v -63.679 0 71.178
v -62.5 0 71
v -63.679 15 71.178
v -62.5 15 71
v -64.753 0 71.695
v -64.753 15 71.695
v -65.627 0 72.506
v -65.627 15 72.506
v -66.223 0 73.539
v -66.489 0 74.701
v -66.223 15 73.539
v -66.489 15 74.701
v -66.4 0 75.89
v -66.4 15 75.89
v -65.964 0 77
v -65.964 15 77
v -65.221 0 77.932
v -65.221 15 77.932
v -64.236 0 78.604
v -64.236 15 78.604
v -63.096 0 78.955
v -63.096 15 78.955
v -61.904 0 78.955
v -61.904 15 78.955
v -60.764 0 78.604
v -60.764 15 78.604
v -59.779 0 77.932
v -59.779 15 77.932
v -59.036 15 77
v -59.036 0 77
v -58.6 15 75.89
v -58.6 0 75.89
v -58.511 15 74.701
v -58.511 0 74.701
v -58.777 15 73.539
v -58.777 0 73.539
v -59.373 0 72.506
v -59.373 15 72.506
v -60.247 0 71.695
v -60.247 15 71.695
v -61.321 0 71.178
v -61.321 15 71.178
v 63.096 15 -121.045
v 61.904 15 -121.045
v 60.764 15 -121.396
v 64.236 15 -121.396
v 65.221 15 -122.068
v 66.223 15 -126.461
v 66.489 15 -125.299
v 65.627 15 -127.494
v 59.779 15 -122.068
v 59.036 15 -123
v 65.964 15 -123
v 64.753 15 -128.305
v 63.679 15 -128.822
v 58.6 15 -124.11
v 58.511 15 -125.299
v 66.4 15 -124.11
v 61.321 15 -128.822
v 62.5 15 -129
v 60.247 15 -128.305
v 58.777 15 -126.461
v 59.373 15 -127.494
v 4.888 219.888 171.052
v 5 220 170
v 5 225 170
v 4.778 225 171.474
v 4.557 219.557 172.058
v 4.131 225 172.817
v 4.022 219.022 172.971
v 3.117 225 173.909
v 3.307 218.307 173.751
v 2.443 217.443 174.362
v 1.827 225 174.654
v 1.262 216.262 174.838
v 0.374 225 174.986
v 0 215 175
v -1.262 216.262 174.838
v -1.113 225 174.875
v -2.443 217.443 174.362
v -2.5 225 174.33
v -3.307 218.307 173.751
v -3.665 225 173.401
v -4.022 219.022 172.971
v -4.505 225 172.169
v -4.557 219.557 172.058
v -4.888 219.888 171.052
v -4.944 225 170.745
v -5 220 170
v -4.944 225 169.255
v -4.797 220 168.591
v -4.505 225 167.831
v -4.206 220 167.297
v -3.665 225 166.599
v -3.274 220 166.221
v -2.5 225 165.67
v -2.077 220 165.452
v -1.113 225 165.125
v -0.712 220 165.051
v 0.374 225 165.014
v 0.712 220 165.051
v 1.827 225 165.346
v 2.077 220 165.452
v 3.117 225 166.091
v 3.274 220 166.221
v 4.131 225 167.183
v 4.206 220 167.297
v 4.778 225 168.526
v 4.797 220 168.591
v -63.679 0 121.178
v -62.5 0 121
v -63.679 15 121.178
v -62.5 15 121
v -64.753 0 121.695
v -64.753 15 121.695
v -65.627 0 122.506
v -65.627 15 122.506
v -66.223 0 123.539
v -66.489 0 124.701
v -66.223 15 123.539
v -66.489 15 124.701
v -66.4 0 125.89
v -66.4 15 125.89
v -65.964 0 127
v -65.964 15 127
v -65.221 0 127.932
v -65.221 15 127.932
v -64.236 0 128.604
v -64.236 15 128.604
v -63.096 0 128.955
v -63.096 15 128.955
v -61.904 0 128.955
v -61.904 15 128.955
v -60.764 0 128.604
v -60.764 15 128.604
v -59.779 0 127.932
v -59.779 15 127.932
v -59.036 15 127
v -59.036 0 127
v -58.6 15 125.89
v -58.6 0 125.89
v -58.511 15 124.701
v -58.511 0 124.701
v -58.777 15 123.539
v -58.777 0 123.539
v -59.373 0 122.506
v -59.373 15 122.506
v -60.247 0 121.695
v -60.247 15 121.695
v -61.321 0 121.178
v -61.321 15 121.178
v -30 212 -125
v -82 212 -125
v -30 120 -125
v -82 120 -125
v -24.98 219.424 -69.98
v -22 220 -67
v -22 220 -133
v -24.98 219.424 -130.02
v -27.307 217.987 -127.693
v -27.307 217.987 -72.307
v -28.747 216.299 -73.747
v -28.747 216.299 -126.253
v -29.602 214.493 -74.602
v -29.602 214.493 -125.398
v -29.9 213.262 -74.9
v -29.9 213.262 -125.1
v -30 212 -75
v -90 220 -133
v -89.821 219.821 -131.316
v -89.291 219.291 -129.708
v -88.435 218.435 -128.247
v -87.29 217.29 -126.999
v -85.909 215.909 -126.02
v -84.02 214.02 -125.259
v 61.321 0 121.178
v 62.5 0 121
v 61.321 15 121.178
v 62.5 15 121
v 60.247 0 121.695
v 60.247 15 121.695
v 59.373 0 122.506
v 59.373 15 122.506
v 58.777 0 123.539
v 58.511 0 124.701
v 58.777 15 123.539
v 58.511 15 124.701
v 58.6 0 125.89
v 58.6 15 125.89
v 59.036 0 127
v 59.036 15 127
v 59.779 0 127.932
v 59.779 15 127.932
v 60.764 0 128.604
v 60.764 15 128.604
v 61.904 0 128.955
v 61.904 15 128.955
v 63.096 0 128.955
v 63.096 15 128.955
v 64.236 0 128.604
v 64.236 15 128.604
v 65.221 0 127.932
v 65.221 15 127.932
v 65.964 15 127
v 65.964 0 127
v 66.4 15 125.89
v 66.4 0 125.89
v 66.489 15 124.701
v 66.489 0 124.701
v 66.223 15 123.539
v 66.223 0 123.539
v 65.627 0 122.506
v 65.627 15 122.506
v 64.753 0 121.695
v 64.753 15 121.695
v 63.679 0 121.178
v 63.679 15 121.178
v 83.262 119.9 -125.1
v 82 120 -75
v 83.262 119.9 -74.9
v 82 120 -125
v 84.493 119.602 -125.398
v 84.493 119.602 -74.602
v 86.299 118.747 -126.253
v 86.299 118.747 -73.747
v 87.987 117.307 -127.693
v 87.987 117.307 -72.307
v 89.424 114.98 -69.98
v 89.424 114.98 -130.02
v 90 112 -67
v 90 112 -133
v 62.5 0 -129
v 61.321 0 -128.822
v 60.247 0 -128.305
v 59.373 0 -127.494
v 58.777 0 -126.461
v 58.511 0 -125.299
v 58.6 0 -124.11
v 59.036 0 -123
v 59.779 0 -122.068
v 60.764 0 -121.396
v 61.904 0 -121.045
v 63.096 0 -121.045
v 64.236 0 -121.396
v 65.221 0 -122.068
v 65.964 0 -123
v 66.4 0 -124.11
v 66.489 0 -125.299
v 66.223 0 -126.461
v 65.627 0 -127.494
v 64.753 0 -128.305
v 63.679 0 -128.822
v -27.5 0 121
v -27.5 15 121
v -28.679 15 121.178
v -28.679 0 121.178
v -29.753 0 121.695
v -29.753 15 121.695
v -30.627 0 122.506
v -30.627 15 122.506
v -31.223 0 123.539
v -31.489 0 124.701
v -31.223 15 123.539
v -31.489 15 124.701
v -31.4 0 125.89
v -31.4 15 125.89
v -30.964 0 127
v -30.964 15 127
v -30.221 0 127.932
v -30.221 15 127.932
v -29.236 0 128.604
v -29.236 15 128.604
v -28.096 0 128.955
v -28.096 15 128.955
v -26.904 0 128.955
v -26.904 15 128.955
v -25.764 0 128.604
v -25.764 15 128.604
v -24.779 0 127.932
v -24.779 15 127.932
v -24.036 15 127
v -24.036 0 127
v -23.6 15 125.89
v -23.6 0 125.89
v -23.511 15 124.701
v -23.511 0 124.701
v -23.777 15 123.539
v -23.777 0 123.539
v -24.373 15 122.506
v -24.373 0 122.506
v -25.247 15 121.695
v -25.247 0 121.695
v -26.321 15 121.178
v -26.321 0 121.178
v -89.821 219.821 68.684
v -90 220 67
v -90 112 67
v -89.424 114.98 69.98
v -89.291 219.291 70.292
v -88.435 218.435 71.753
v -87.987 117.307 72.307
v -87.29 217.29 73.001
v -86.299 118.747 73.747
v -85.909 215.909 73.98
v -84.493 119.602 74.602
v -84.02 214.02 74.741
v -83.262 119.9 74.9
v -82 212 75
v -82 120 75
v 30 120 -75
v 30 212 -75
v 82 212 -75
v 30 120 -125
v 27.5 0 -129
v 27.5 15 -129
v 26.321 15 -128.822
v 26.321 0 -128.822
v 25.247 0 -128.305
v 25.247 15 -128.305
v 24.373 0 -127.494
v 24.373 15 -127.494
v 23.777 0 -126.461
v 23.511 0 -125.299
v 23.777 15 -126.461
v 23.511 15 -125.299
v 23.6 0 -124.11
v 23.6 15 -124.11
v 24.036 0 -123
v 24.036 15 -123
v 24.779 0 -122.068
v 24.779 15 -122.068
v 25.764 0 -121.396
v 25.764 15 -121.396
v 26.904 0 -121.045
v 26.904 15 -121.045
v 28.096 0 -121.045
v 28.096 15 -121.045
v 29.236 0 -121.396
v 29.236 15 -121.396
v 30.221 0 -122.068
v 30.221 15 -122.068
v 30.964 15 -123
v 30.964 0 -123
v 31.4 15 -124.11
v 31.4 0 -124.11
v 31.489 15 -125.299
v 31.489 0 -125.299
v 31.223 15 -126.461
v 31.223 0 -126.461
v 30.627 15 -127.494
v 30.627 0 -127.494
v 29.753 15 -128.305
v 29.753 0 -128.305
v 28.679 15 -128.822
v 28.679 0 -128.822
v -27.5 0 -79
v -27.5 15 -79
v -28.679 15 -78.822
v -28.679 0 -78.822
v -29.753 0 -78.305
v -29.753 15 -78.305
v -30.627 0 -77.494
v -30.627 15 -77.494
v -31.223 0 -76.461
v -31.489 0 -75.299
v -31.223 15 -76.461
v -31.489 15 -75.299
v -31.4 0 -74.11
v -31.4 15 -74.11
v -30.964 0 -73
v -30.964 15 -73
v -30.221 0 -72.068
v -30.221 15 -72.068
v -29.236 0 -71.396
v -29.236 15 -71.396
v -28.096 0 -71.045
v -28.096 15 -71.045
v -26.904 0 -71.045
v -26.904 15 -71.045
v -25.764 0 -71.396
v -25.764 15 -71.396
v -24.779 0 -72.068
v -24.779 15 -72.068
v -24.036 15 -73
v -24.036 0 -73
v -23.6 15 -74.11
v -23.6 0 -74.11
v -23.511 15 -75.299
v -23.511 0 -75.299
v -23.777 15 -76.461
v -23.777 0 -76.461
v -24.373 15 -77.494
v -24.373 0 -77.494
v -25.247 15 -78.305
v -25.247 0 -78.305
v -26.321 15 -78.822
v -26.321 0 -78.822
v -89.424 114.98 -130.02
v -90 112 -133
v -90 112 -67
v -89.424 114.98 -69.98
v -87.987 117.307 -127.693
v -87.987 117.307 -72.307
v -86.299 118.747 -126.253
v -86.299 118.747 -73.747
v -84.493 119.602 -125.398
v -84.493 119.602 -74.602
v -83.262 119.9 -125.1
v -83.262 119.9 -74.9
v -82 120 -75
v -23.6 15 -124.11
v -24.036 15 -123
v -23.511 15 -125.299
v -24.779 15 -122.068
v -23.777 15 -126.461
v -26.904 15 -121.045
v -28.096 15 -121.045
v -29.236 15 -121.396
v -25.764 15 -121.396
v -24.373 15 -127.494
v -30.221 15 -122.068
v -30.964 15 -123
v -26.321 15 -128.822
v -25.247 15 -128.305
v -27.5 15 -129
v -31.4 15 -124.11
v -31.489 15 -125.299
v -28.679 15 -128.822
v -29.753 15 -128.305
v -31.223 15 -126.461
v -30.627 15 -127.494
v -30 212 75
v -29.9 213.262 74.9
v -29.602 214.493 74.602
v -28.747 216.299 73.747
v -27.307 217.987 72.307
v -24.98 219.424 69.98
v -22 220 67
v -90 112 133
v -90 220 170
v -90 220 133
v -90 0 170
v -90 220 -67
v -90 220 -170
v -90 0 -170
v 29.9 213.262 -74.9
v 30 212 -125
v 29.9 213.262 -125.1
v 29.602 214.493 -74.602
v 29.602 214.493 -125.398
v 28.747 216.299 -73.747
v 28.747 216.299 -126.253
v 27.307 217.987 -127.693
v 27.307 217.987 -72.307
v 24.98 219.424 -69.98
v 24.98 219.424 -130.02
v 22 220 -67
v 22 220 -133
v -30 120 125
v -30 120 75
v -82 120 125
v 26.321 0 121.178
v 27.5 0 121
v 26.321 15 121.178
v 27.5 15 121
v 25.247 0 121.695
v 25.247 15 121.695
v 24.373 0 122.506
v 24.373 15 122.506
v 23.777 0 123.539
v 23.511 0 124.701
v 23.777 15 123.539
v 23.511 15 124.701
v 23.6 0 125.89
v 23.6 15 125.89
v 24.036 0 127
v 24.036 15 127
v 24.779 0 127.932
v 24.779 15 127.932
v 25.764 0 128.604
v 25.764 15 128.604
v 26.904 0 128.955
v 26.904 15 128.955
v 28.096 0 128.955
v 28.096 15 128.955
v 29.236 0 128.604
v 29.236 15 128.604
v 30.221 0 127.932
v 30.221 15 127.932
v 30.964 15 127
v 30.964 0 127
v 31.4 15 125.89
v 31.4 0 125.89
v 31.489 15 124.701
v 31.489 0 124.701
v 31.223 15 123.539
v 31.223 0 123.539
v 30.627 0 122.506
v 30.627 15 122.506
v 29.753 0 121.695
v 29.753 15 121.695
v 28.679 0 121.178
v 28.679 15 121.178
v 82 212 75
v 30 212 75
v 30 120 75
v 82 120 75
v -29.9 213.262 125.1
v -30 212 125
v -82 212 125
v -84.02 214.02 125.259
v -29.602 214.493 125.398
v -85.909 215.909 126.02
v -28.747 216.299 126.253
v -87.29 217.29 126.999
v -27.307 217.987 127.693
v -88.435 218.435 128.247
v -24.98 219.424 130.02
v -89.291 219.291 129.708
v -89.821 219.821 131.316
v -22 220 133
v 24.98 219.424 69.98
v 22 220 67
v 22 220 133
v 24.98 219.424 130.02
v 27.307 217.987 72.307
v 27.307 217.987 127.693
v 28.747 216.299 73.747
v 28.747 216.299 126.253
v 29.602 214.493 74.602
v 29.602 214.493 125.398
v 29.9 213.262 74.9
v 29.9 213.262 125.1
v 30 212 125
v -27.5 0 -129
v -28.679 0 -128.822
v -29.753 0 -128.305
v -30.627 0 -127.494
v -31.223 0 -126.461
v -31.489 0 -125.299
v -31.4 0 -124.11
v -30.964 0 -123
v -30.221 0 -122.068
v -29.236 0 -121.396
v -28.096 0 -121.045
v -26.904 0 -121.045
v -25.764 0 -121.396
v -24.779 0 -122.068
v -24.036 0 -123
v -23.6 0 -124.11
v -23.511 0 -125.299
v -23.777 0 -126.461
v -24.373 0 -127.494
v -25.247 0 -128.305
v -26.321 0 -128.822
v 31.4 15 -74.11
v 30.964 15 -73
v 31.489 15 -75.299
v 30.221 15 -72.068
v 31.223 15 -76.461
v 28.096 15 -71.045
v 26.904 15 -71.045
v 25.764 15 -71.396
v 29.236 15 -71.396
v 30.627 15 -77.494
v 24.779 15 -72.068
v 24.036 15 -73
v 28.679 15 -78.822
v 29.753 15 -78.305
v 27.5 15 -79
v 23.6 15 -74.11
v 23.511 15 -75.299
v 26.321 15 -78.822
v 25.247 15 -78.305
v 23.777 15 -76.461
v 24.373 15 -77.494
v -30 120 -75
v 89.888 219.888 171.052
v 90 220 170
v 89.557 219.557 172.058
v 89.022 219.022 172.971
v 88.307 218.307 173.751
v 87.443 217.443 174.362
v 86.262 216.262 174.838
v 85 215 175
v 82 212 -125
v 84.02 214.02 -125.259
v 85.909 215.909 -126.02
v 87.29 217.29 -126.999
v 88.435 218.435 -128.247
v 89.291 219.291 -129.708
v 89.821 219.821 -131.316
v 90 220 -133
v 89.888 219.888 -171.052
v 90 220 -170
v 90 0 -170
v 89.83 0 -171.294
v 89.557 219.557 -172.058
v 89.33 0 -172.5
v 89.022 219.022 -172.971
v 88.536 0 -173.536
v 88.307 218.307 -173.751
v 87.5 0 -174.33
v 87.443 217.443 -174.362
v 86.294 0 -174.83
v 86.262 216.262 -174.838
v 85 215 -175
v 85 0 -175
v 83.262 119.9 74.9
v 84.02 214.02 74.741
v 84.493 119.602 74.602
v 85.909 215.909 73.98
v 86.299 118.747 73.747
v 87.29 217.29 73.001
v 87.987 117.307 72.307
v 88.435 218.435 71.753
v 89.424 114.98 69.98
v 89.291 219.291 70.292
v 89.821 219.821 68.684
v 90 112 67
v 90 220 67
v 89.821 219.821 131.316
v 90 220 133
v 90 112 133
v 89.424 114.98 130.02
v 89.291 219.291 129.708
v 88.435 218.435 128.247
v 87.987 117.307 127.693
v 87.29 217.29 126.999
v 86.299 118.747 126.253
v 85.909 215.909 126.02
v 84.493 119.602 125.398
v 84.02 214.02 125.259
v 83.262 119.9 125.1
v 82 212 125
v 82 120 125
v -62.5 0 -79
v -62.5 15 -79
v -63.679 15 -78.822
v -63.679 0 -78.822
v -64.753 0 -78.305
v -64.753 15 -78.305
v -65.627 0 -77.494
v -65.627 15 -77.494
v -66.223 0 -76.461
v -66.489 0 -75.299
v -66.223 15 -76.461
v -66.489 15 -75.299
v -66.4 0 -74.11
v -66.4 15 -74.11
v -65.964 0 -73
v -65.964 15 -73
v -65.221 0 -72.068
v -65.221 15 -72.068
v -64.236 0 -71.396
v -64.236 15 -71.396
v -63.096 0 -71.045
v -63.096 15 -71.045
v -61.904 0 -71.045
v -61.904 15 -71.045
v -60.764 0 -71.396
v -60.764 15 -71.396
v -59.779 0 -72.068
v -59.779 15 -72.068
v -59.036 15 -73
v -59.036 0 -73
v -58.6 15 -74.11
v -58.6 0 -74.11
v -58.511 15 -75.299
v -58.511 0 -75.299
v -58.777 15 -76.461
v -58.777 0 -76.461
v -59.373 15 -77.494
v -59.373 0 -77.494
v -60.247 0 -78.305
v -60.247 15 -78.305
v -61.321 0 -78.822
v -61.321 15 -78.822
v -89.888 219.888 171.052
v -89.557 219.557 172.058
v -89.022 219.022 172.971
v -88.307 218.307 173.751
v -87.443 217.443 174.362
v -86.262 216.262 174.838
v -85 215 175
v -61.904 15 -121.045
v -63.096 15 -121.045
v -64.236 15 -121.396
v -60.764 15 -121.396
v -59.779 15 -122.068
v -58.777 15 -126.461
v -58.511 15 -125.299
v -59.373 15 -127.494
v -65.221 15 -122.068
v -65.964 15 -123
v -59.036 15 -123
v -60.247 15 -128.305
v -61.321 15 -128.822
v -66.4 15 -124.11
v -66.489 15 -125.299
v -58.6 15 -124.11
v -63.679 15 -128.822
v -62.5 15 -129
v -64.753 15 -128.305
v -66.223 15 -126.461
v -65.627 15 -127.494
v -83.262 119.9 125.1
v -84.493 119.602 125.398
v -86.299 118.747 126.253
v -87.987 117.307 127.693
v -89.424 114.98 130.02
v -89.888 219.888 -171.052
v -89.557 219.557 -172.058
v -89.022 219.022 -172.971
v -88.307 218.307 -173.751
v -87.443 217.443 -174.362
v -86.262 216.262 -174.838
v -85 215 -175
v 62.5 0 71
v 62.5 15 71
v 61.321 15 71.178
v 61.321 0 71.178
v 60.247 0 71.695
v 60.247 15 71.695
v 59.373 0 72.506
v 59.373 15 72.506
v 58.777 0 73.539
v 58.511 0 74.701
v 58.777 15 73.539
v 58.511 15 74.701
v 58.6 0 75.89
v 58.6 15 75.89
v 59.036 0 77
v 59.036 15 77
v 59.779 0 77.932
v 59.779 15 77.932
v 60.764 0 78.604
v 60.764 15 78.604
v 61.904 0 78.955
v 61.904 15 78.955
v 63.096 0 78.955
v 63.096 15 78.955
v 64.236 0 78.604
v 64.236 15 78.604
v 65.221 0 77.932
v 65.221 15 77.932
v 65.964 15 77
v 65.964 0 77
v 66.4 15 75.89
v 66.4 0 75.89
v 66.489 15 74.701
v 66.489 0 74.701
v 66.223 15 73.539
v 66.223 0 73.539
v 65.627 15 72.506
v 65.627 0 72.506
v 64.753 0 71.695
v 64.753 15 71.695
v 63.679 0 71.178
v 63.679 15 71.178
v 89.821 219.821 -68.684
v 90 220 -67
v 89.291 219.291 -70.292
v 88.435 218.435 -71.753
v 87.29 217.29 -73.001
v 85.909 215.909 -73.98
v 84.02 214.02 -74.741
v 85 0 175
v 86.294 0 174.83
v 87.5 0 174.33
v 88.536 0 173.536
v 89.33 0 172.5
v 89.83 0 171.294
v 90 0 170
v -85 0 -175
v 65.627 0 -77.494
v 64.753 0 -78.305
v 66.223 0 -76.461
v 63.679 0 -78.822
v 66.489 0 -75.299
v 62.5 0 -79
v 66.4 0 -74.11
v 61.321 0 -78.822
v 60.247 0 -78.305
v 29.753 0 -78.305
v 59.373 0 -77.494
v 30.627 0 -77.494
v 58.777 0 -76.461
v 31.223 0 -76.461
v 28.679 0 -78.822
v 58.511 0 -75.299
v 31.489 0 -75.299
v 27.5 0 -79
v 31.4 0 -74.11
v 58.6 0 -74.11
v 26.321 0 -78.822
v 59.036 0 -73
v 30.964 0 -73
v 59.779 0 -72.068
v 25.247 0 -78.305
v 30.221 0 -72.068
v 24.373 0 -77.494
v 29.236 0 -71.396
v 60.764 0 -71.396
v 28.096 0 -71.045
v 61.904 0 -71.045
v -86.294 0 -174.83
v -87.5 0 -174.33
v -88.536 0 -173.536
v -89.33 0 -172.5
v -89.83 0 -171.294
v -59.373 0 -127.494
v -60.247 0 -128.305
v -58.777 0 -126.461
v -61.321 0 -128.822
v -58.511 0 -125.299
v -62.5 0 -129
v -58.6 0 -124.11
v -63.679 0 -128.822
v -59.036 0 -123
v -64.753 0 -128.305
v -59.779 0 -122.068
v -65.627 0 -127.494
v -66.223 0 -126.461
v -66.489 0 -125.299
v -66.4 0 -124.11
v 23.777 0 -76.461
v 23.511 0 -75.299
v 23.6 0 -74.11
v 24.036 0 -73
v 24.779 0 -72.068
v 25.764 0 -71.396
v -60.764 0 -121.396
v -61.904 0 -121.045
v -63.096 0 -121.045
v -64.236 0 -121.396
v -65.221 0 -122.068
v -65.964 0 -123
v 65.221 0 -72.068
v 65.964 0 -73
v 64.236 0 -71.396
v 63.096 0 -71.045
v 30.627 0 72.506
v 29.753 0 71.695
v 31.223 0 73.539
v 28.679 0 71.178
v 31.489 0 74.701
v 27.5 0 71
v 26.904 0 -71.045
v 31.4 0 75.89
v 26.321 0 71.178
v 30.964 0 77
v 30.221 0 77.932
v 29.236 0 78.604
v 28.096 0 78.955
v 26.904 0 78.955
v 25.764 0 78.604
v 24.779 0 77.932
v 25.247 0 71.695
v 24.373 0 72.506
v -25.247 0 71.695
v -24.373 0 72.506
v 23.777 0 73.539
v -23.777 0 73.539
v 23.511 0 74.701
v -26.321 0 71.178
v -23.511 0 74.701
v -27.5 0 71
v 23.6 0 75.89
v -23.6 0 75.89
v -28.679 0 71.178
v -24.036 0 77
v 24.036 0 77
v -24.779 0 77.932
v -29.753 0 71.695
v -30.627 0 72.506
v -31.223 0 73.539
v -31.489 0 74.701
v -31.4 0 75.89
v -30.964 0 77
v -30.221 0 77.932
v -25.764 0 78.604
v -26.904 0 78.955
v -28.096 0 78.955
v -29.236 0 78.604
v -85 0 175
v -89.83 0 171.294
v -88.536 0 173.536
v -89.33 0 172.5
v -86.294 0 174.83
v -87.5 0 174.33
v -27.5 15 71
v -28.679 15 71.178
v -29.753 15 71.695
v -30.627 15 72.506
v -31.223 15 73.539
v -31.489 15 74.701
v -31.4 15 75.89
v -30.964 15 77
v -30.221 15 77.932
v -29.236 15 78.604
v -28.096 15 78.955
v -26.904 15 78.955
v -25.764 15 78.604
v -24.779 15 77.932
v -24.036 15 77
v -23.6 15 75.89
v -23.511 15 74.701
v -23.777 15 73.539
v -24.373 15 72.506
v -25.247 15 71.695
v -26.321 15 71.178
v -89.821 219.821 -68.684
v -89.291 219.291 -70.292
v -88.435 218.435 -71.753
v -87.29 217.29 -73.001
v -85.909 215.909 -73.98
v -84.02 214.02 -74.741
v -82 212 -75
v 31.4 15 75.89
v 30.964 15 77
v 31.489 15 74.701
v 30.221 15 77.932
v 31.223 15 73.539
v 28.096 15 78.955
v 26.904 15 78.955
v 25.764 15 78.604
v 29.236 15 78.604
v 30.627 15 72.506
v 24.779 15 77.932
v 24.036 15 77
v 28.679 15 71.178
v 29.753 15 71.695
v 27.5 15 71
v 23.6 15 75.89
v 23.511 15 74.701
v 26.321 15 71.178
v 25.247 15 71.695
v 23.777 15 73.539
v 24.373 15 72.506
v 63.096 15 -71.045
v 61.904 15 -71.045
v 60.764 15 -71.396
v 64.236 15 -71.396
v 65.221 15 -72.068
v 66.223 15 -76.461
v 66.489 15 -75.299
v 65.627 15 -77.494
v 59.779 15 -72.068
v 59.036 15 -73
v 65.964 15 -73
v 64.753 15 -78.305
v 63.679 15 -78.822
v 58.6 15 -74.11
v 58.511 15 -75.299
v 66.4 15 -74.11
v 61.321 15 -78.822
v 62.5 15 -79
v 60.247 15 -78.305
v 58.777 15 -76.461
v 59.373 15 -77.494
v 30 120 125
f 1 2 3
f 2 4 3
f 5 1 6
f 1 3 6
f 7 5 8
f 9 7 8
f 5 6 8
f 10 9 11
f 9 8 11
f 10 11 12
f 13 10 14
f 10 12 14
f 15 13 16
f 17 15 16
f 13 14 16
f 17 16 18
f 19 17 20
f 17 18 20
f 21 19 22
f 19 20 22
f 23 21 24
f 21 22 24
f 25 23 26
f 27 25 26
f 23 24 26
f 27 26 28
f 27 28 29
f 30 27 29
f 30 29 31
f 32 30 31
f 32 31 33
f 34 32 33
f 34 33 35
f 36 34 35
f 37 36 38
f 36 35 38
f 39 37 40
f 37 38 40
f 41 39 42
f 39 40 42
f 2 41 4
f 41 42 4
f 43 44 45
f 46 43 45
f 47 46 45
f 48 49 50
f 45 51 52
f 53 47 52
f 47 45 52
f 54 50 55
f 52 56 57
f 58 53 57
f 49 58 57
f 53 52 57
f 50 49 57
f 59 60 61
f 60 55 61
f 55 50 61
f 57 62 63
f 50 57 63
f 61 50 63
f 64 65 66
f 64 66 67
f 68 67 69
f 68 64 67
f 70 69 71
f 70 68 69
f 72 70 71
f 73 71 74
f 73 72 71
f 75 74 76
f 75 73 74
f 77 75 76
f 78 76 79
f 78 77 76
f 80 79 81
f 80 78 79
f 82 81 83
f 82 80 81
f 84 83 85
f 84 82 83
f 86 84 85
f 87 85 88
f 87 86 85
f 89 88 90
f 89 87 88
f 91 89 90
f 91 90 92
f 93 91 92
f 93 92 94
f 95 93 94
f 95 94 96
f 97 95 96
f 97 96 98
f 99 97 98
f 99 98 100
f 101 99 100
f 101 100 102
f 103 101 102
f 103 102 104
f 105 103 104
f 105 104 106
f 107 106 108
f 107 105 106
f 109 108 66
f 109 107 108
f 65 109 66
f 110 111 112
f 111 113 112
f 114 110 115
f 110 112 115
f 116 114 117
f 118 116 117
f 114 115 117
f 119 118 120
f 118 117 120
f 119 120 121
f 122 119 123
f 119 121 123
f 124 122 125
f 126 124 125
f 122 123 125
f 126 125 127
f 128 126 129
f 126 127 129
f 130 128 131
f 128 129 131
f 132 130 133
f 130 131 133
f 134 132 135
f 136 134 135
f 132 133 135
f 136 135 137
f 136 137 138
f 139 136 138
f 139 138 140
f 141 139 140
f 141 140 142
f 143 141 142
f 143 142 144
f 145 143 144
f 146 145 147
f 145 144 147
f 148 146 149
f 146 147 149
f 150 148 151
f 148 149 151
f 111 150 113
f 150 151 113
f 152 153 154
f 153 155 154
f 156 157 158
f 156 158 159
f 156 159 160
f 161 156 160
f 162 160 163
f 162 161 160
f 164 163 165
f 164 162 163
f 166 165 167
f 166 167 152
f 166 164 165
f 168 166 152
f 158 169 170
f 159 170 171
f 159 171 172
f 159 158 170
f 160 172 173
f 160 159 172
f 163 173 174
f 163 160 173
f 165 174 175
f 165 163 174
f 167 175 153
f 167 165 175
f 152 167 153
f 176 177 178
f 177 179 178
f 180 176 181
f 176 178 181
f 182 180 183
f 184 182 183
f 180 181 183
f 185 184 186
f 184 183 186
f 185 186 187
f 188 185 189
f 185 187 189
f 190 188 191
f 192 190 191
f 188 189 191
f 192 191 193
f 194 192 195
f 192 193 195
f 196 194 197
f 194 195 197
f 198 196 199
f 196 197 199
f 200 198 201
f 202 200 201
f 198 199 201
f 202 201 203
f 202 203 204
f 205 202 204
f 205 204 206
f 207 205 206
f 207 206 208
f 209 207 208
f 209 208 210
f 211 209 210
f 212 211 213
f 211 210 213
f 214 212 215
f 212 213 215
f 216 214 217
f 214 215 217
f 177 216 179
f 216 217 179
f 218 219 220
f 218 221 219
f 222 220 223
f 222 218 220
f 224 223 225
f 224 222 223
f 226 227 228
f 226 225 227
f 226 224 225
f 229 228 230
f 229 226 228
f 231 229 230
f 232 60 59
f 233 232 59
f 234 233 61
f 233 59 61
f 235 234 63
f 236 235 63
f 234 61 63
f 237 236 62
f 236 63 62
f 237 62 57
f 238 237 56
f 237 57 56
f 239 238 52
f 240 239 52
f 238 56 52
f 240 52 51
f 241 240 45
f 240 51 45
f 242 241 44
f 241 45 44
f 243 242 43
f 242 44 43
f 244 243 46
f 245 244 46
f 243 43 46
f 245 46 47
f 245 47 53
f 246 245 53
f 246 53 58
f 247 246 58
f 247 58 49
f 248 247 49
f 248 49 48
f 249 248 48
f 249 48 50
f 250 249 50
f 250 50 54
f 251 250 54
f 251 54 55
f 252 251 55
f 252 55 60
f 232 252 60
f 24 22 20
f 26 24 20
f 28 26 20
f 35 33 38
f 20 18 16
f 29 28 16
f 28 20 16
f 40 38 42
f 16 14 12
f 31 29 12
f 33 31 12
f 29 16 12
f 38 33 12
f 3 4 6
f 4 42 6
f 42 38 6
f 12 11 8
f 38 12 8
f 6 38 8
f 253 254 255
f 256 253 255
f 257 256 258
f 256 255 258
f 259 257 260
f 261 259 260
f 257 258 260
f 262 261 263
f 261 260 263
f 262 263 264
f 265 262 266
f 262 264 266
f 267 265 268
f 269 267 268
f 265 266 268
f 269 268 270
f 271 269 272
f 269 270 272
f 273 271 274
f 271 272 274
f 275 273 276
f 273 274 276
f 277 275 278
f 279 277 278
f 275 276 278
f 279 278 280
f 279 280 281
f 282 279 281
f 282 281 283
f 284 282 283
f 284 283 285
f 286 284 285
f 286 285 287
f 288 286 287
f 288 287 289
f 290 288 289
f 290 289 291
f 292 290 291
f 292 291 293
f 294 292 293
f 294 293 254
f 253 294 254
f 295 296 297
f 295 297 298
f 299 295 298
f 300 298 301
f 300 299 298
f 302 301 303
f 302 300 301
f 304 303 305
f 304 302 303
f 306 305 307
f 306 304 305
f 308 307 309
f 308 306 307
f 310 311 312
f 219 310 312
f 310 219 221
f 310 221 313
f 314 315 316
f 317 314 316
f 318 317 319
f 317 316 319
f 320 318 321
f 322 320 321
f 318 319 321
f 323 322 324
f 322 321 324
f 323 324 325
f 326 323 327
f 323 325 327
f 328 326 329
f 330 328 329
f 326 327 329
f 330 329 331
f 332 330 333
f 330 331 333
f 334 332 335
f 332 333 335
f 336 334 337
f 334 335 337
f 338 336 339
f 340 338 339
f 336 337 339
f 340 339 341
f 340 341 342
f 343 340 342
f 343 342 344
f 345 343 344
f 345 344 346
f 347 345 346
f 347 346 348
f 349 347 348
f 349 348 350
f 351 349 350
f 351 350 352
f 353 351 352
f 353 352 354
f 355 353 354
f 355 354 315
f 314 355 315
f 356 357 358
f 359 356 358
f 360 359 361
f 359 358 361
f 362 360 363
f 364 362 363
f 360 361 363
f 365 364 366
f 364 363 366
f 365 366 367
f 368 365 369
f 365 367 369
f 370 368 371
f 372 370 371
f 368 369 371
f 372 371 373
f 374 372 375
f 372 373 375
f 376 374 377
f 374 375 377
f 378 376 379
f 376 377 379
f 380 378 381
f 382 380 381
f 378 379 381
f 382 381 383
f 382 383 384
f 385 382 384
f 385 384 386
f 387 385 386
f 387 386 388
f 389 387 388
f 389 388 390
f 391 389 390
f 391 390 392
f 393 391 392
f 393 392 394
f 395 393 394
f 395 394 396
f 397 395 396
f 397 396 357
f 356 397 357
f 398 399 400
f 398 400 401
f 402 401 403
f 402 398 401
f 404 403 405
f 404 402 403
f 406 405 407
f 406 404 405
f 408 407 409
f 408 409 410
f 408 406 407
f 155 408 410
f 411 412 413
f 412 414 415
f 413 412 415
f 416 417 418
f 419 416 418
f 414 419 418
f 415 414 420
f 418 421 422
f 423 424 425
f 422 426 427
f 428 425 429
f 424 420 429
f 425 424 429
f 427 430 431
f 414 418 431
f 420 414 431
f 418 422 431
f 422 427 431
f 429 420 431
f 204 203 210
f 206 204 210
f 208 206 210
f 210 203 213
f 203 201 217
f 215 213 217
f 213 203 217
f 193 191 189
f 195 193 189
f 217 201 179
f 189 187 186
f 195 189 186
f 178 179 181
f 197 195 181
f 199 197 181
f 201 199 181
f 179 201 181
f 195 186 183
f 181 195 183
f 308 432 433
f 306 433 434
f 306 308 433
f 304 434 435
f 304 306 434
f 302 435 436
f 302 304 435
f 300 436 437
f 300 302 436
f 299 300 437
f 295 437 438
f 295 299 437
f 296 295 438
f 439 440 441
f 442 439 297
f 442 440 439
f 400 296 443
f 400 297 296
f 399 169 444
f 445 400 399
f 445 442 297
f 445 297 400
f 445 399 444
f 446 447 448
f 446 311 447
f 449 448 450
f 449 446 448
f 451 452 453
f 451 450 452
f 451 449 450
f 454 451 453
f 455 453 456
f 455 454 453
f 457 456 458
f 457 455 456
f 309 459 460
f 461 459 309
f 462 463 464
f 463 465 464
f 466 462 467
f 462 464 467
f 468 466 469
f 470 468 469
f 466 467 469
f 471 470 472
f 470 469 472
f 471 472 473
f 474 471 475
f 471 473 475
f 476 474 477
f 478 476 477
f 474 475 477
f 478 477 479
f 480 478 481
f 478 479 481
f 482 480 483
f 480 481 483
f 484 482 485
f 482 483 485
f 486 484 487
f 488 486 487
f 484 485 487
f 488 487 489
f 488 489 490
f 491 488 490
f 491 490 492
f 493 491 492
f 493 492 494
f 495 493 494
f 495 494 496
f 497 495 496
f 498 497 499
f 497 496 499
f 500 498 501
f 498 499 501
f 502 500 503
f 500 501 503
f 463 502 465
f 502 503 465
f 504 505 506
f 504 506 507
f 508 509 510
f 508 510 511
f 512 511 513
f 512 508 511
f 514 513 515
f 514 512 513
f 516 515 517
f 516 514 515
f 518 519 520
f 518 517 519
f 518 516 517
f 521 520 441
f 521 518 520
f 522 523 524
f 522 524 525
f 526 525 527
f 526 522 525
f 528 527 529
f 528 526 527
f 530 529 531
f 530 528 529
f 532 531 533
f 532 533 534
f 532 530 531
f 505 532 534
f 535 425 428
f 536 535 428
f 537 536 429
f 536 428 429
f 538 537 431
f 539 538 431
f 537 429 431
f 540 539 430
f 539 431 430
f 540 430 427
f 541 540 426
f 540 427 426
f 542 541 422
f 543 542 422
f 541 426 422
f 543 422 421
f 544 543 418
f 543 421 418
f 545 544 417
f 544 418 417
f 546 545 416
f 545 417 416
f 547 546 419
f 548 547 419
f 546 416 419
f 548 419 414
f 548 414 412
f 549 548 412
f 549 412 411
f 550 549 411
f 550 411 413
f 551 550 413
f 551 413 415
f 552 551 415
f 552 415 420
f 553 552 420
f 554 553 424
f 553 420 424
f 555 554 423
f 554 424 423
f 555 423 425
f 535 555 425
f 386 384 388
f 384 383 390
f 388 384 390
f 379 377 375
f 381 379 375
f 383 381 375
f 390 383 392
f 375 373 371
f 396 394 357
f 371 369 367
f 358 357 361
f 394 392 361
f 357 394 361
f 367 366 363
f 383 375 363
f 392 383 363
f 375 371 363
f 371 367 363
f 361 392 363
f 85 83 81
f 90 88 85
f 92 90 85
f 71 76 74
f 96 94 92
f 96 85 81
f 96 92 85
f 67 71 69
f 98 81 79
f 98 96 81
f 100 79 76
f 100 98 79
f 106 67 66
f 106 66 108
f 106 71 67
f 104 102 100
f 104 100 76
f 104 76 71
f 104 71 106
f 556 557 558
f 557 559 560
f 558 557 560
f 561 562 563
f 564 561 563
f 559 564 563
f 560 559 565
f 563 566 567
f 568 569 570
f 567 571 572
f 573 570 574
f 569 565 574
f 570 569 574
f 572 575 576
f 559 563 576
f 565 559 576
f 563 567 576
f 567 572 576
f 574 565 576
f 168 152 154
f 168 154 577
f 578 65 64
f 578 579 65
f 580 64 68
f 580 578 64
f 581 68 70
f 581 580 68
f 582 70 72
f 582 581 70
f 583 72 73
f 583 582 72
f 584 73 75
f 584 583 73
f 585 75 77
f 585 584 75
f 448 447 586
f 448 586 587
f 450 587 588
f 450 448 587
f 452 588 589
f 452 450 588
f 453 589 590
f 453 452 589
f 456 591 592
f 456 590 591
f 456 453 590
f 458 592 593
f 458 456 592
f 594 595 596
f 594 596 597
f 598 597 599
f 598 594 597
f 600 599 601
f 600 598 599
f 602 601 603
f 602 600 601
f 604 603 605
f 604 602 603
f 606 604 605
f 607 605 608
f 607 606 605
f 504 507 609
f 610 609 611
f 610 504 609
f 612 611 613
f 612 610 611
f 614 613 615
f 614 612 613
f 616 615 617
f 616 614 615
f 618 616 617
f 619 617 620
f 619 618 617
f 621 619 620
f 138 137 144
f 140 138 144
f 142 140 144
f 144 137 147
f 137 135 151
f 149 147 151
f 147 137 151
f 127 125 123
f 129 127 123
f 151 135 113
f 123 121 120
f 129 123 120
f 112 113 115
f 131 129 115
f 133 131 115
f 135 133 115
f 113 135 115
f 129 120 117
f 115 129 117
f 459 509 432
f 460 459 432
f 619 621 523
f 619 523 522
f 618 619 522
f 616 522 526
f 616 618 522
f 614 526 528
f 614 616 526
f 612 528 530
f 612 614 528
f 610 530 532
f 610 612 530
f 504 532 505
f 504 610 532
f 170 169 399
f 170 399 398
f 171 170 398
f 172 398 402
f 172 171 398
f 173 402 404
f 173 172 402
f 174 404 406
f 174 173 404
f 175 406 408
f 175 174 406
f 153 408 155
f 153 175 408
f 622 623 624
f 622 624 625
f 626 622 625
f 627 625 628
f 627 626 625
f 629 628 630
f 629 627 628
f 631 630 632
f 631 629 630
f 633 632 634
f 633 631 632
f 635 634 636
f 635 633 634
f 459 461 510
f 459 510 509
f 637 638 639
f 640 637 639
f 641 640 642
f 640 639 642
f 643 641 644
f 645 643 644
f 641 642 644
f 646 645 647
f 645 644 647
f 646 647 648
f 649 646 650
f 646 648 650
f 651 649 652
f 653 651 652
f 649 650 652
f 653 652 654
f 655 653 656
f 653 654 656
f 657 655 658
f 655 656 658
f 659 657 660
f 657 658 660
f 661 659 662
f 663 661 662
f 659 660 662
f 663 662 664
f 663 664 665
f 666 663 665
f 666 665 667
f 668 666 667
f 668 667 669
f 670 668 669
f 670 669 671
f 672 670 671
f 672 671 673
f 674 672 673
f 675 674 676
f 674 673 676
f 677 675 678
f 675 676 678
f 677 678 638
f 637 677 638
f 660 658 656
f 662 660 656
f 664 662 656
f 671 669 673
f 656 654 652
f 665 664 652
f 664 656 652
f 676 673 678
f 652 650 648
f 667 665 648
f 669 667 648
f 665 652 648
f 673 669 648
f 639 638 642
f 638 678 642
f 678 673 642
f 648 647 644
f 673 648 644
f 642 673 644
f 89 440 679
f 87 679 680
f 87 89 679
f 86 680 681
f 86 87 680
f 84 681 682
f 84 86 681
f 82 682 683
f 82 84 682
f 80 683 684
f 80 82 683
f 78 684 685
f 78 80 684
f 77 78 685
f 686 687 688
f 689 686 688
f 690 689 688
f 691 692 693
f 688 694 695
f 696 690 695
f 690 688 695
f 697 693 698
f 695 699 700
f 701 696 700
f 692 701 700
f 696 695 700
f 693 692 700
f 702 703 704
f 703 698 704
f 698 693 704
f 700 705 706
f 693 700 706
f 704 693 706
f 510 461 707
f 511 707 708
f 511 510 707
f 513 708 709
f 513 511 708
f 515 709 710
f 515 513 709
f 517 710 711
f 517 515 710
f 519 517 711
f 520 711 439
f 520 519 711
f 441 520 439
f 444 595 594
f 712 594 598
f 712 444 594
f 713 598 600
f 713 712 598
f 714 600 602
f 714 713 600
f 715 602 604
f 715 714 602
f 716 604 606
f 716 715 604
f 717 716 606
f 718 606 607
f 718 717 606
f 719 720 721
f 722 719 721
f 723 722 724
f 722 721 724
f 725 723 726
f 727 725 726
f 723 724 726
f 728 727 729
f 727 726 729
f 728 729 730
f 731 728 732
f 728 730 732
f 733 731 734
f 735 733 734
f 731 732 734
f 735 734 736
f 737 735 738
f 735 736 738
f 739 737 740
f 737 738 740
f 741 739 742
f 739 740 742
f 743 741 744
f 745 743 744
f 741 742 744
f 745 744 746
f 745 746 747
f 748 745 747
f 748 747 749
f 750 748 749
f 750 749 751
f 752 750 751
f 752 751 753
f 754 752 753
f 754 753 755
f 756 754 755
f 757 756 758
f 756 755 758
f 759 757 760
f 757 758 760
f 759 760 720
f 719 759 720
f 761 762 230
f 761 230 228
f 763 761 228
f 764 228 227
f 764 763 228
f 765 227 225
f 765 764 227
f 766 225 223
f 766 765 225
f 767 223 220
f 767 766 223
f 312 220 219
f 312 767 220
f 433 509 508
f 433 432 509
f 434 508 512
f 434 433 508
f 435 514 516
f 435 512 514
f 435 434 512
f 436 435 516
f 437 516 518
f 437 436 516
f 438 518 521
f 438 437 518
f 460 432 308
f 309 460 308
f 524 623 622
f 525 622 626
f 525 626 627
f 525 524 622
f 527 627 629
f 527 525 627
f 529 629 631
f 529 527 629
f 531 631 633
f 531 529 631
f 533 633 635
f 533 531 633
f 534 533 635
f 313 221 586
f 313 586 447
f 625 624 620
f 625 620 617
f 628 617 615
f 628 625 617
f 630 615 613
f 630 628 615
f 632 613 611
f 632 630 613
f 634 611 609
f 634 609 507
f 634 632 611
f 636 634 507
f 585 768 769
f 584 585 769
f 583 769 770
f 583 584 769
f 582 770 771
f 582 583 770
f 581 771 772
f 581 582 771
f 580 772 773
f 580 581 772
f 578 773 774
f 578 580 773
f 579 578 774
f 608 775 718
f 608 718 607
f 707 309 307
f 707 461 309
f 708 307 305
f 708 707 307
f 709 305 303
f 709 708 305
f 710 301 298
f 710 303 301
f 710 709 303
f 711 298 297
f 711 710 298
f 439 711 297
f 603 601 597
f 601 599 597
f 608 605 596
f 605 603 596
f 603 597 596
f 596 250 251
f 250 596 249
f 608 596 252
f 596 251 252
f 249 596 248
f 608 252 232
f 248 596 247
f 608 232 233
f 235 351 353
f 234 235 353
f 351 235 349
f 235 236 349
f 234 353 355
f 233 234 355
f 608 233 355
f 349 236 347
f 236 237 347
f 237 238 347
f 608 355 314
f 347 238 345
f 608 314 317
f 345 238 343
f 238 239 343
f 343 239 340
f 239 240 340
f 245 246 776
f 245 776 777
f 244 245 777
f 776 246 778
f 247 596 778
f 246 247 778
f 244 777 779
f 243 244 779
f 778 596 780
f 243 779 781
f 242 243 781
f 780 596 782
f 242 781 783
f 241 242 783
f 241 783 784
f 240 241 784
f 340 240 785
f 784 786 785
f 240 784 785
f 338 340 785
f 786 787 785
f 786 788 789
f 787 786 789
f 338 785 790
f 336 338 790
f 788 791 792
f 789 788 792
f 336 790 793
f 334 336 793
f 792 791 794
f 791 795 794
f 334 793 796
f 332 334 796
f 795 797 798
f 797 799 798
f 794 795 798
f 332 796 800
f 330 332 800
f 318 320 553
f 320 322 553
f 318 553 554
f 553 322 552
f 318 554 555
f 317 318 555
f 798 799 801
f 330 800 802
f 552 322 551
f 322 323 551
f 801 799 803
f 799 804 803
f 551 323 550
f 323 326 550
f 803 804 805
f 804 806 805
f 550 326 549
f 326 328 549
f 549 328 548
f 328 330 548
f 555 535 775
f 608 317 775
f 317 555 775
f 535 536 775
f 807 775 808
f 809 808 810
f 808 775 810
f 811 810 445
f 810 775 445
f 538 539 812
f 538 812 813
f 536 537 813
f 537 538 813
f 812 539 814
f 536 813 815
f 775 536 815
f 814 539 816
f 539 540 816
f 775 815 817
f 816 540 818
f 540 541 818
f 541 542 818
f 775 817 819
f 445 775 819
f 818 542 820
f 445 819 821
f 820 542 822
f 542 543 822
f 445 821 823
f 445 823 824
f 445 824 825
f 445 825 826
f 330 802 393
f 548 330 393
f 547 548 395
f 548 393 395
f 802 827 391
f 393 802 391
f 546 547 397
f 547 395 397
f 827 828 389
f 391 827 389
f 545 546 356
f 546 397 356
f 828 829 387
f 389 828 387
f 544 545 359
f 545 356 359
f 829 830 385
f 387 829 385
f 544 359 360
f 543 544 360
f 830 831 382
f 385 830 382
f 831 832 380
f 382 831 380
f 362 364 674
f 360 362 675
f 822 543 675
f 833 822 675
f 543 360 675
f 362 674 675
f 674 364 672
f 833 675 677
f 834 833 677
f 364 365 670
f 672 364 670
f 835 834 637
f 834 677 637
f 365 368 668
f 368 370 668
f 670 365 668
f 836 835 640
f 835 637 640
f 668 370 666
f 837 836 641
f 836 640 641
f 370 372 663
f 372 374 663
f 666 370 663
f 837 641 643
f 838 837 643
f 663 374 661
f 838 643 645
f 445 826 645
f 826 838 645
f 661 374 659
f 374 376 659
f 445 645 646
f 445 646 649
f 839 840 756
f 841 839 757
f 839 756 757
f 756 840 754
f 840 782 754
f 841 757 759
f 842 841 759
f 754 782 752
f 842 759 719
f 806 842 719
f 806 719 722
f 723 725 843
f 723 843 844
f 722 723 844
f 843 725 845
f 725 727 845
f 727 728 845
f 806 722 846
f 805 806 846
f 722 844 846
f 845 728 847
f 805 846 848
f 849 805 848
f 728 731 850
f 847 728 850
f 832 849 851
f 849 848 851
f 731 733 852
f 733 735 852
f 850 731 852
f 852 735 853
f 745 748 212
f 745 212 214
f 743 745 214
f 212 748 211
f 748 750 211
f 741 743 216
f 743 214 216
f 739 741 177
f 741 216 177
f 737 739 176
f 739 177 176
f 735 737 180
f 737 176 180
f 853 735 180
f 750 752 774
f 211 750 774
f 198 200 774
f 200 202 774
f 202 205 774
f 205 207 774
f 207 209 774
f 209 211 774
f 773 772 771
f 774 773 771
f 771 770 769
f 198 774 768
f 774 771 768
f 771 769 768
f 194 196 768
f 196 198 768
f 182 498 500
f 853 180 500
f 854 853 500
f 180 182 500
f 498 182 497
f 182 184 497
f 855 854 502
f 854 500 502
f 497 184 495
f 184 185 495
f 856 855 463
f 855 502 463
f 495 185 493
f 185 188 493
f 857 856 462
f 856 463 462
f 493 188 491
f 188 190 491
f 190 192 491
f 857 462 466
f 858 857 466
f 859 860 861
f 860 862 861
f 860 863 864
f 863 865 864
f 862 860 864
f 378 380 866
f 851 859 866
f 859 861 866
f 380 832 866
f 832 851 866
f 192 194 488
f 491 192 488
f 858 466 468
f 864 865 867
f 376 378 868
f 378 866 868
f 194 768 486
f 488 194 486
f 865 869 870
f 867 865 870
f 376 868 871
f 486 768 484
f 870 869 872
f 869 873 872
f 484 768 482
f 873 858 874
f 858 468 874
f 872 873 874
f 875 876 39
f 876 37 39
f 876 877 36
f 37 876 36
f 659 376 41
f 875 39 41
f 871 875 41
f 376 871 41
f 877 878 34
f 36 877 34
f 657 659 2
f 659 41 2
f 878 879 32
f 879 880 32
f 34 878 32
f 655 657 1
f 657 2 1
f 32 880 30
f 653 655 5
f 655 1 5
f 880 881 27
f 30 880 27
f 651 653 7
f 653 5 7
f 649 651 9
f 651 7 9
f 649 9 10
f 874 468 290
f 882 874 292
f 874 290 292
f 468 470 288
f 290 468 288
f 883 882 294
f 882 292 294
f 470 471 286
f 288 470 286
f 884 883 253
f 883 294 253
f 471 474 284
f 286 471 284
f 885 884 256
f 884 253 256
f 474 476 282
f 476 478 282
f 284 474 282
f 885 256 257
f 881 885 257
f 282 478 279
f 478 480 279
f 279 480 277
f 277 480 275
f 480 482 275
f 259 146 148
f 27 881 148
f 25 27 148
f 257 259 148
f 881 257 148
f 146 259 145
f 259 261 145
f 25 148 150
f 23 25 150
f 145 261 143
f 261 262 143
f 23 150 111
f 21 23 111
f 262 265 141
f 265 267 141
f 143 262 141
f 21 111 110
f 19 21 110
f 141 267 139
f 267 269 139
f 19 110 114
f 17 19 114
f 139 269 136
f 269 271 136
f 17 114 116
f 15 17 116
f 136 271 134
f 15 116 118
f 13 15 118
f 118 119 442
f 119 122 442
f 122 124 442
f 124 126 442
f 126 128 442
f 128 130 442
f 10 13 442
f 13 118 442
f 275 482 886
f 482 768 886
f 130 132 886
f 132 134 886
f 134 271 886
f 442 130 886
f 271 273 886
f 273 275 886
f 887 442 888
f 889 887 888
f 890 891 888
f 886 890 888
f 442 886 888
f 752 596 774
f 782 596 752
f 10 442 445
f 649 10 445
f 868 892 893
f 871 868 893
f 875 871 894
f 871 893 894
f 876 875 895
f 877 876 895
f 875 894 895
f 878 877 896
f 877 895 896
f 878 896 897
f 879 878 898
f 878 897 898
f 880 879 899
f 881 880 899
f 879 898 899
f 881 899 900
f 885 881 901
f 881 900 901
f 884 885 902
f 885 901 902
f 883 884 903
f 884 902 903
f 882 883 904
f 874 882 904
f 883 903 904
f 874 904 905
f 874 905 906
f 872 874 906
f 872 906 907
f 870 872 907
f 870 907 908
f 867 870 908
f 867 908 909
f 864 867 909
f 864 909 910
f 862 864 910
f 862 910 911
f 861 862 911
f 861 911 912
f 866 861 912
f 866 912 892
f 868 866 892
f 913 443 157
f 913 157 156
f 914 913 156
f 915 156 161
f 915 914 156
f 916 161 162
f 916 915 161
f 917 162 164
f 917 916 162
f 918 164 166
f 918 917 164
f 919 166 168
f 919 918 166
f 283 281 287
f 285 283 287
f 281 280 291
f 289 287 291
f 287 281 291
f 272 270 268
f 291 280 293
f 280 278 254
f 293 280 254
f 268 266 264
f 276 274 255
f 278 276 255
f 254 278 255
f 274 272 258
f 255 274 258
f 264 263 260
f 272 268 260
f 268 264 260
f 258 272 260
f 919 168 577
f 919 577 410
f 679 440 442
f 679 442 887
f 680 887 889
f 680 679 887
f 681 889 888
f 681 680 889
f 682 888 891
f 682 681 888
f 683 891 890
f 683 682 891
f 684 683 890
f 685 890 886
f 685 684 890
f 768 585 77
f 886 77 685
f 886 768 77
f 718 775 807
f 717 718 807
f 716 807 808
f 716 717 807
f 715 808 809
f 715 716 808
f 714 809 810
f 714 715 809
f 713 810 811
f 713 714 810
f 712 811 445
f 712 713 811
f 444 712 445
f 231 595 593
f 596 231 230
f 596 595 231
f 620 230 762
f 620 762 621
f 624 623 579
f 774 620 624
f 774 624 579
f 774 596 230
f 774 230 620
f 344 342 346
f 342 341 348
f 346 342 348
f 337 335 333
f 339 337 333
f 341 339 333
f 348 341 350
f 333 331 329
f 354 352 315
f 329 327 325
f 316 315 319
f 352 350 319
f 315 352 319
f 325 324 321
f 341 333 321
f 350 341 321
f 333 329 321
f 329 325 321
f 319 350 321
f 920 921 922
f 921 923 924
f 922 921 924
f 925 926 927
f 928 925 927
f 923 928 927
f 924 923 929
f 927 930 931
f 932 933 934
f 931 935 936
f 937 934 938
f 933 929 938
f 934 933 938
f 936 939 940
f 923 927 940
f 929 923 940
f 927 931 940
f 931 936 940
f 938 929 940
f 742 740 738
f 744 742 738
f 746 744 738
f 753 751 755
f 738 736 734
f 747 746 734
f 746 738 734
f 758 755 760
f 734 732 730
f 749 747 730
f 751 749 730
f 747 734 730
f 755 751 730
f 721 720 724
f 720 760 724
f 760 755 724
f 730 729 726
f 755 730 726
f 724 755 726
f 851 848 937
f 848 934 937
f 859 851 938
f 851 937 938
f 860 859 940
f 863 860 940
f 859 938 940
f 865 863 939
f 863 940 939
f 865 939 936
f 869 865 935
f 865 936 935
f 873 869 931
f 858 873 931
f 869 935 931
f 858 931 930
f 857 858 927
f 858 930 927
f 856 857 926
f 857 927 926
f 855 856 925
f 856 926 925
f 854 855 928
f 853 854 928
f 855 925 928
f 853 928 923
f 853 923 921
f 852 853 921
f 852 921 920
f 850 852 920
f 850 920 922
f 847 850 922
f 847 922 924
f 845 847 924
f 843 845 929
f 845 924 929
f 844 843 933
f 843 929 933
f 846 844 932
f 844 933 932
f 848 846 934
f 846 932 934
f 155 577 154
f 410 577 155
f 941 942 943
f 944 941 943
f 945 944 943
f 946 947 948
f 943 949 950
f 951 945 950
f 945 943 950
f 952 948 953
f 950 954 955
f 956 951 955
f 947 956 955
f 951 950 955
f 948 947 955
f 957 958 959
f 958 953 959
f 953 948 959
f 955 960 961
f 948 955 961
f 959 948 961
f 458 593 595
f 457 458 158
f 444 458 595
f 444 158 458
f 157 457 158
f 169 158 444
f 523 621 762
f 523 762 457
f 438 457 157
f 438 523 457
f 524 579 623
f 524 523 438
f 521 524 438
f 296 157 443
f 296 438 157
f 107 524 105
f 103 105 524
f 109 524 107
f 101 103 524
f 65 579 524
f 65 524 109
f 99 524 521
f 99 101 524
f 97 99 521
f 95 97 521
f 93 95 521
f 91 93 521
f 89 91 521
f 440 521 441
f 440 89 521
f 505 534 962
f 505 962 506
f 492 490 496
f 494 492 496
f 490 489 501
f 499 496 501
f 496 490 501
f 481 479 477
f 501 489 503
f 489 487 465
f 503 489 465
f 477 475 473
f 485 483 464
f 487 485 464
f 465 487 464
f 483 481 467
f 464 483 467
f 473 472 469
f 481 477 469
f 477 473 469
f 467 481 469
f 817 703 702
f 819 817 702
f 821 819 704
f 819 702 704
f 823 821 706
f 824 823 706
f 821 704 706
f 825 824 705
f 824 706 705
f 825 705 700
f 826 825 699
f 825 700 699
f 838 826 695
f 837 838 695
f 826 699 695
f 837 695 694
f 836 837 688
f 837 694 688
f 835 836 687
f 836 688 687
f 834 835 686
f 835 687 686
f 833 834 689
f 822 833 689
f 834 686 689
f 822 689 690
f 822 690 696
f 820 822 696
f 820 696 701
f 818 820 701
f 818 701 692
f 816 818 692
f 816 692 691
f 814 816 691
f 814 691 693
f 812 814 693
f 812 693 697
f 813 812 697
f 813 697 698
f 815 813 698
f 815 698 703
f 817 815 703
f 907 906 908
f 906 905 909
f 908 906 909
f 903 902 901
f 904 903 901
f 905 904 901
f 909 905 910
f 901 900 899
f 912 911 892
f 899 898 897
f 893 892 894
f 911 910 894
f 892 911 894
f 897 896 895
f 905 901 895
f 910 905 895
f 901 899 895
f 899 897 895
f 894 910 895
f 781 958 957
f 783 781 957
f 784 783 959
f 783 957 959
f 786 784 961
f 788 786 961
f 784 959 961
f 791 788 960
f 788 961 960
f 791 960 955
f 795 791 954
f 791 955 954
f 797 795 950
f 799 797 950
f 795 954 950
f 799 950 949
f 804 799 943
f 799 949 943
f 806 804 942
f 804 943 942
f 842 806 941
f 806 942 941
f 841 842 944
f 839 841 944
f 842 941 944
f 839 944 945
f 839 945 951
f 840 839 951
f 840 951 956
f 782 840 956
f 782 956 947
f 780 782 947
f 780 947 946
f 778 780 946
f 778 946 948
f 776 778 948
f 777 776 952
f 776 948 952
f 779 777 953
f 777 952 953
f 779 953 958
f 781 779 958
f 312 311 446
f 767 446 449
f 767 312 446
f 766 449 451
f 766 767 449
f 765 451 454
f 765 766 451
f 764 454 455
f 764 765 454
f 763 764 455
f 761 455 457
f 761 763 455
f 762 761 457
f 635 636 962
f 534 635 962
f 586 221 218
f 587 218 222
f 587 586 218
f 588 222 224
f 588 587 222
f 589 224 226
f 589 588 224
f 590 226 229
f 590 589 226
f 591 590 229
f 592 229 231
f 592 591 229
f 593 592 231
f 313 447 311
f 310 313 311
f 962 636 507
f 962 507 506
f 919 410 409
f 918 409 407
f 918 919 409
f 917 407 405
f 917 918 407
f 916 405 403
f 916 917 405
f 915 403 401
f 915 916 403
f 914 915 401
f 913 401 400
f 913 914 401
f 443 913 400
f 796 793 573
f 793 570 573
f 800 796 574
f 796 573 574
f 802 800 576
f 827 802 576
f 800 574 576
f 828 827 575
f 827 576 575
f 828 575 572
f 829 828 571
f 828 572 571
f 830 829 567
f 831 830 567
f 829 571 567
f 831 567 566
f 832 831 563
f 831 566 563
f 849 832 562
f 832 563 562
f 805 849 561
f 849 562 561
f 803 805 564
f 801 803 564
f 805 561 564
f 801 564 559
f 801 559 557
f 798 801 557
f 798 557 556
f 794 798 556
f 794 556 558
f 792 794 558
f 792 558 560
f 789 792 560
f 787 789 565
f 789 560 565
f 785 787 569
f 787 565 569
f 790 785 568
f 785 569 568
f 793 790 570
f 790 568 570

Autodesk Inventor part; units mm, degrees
ref_plane "YZ Plane" through (0, 0, 0) normal (1, 0, 0) x (0, 1, 0)
ref_plane "XZ Plane" through (0, 0, 0) normal (0, 1, 0) x (-1, 0, 0)
ref_plane "XY Plane" through (0, 0, 0) normal (0, 0, 1) x (1, 0, 0)
sketch "Sketch1" plane through (0, 0, 0) normal (0, 1, 0) x (-1, 0, 0)
  line L0 (0, 0) -> (90, 0) construction
  line L1 (90, 0) -> (90, 175)
  line L2 (90, 175) -> (0, 175)
  line L3 (0, 175) -> (0, 0) construction
  line L4 (90, 125) -> (0, 125)
  line L5 (0, 125) -> (0, 75) construction
  line L6 (0, 75) -> (90, 75)
  line L7 (90, 75) -> (90, 125)
  line L8 (30, 125) -> (30, 75)
  line L9 (27.5, 75) -> (62.5, 75) construction
  line L10 (62.5, 75) -> (62.5, 125) construction
  line L11 (62.5, 125) -> (27.5, 125) construction
  line L12 (27.5, 125) -> (27.5, 75) construction
  line L13 (27.5, 75) -> (62.5, 125) construction
  line L14 (62.5, 75) -> (27.5, 125) construction
  line L15 (90, 0) -> (90, -175)
  line L16 (90, -175) -> (0, -175)
  line L17 (90, -125) -> (0, -125)
  line L18 (0, -75) -> (90, -75)
  line L19 (90, -75) -> (90, -125)
  line L20 (30, -125) -> (30, -75)
  line L21 (27.5, -75) -> (62.5, -75) construction
  line L22 (62.5, -75) -> (62.5, -125) construction
  line L23 (62.5, -125) -> (27.5, -125) construction
  line L24 (27.5, -125) -> (27.5, -75) construction
  line L25 (27.5, -75) -> (62.5, -125) construction
  line L26 (62.5, -75) -> (27.5, -125) construction
  line L27 (-90, 0) -> (-90, 175)
  line L28 (-90, 175) -> (0, 175)
  line L29 (-90, 125) -> (0, 125)
  line L30 (0, 75) -> (-90, 75)
  line L31 (-90, 75) -> (-90, 125)
  line L32 (-30, 125) -> (-30, 75)
  line L33 (-27.5, 75) -> (-62.5, 75) construction
  line L34 (-62.5, 75) -> (-62.5, 125) construction
  line L35 (-62.5, 125) -> (-27.5, 125) construction
  line L36 (-27.5, 125) -> (-27.5, 75) construction
  line L37 (-27.5, 75) -> (-62.5, 125) construction
  line L38 (-62.5, 75) -> (-27.5, 125) construction
  line L39 (-90, 0) -> (-90, -175)
  line L40 (-90, -175) -> (0, -175)
  line L41 (-90, -125) -> (0, -125)
  line L42 (0, -75) -> (-90, -75)
  line L43 (-90, -75) -> (-90, -125)
  line L44 (-30, -125) -> (-30, -75)
  line L45 (-27.5, -75) -> (-62.5, -75) construction
  line L46 (-62.5, -75) -> (-62.5, -125) construction
  line L47 (-62.5, -125) -> (-27.5, -125) construction
  line L48 (-27.5, -125) -> (-27.5, -75) construction
  line L49 (-27.5, -75) -> (-62.5, -125) construction
  line L50 (-62.5, -75) -> (-27.5, -125) construction
  line L51 (45, 100) -> (90, 100) construction
  point P0 (45, -100)
  point P1 (-45, 100)
  point P2 (-45, -100)
  point P3 (45, -100)
  point P4 (-45, 100)
  dimension "d0" = 200
  dimension "d1" = 35
  dimension "d2" = 50
  dimension "d3" = 90
  dimension "d4" = 180
  dimension "d5" = 50
  dimension "d6" = 50
  dimension "d7" = 60
extrude "Extrusion1" add sketch "Sketch1" along normal blind 220 contours L15 L18 L42 L39 L27 L30 L6 L1 | L4 L29 L27 L28 L2 L1 | L6 L30 L32 L29 L4 L8 | L15 L16 L40 L39 L41 L17 | L20 L17 L41 L44 L42 L18
extrude "Extrusion2" add sketch "Sketch1" along normal blind 120 contours L6 L8 L4 L1 | L15 L17 L20 L18 | L30 L27 L29 L32 | L44 L41 L39 L42
hole "Hole1" at (-62.5, 0, 125) at (-27.5, 0, 125) at (-27.5, 0, 75) at (-62.5, 0, 75) at (-62.5, 0, -75) at (-27.5, 0, -75) at (-27.5, 0, -125) at (-62.5, 0, -125) at (62.5, 0, 75) at (27.5, 0, 75) at (27.5, 0, 125) at (62.5, 0, 125) at (62.5, 0, -125) at (27.5, 0, -125) at (27.5, 0, -75) at (62.5, 0, -75) direction (0, 1, 0) diameter 8 depth 15
fillet "Fillet1" radius 5 6 edges at (0, 220, -175) (-90, 110, -175) (90, 110, -175) (-90, 110, 175) (0, 220, 175) (90, 110, 175)
fillet "Fillet2" radius 8 24 edges at (-60, 220, -125) (-90, 170, -125) (-60, 220, -75) (-90, 170, -75) (-90, 120, -100) (-30, 220, -100) (-60, 220, 75) (-30, 220, 100) (-60, 220, 125) (-90, 170, 75) (-90, 120, 100) (-90, 170, 125) (60, 220, -75) (30, 220, -100) (60, 220, -125) (60, 220, 75) (30, 220, 100) (60, 220, 125) (90, 170, 75) (90, 170, 125) (90, 120, 100) (90, 170, -75) (90, 120, -100) (90, 170, -125)
sketch "Sketch2" plane through (0, 220, 0) normal (0, 1, 0) x (1, 0, 0)
  line L0 (90, -170) -> (-90, -170) projected
  circle A0 centre (0, -170) radius 5
  point P0 (0, 0)
  dimension "d21" = 10
extrude "Extrusion3" add sketch "Sketch2" along normal mid plane 10
properties part number "SACMI DPA C-RAIL BOTTOM SUPPORT"
